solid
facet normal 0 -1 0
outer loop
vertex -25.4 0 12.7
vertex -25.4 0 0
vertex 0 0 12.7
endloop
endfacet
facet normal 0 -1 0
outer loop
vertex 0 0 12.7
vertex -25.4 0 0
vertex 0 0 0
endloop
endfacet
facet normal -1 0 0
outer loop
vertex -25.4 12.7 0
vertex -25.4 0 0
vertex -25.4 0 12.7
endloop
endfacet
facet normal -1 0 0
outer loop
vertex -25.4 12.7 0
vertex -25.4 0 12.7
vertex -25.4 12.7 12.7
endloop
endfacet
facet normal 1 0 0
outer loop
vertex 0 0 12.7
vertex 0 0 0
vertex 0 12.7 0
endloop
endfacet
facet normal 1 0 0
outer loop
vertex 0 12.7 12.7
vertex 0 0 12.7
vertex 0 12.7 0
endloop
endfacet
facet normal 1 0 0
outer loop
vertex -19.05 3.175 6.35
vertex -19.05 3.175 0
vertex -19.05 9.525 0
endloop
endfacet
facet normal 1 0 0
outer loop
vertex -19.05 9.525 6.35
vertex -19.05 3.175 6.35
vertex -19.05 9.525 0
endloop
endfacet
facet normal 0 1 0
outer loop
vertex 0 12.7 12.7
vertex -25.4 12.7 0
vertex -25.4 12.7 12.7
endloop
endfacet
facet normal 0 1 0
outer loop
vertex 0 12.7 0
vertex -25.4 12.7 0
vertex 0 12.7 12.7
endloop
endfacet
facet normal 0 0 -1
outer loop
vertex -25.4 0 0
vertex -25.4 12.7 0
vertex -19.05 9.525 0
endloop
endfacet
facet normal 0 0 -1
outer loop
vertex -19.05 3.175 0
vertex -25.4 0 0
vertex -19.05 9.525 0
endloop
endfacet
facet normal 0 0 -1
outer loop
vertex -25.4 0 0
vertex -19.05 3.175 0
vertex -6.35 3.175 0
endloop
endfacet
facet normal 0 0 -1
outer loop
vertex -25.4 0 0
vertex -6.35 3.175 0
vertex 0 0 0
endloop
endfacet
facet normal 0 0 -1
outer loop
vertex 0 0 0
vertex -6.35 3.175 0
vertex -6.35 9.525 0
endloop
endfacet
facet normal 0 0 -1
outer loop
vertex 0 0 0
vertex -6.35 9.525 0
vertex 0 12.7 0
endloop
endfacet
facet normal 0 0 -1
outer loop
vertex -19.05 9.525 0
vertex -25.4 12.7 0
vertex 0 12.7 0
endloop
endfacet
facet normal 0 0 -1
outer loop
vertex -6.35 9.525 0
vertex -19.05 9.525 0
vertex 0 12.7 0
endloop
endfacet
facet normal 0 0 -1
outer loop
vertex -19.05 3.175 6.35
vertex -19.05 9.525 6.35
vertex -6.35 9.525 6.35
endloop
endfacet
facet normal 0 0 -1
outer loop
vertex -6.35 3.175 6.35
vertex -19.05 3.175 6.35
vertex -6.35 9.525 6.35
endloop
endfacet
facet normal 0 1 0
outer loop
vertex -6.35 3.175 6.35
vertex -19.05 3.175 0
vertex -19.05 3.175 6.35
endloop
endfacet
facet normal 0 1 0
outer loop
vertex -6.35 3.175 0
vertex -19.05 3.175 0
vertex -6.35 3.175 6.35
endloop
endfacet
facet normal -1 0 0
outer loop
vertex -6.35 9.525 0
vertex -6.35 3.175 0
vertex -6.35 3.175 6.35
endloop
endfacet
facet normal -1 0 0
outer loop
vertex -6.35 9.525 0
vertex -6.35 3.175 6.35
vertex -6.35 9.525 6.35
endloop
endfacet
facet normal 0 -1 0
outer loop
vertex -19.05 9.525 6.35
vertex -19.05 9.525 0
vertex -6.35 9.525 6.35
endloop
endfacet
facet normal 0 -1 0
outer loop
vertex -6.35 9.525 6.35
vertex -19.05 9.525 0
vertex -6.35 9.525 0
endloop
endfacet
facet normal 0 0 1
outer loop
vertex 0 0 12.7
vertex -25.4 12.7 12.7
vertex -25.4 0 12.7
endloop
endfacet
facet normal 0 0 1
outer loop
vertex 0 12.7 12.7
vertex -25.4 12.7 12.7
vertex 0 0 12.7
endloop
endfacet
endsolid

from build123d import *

# Parameters (mm, degrees)
SKETCH1_W           = 25.4
SKETCH1_H           = 12.7
SKETCH1_W_2         = 12.7
SKETCH1_H_2         = 6.35
BOSS_EXTRUDE1_DEPTH = 12.7
SKETCH2_W           = 12.7
SKETCH2_H           = 6.35
BOSS_EXTRUDE2_DEPTH = 6.35


with BuildPart() as part:
    # Sketch1 → Boss-Extrude1 (new body)
    with BuildSketch(Plane.XY):
        with Locations((-12.7, 6.35)):
            Rectangle(SKETCH1_W, SKETCH1_H)
        with Locations((-12.7, 6.35)):
            Rectangle(SKETCH1_W_2, SKETCH1_H_2, mode=Mode.SUBTRACT)
    extrude(amount=BOSS_EXTRUDE1_DEPTH)

    # Sketch2 → Boss-Extrude2 (add)
    with BuildSketch(Plane.XY.offset(12.7)):
        with Locations((-12.7, 6.35)):
            Rectangle(SKETCH2_W, SKETCH2_H)
    extrude(amount=-BOSS_EXTRUDE2_DEPTH)


solid = part.part
